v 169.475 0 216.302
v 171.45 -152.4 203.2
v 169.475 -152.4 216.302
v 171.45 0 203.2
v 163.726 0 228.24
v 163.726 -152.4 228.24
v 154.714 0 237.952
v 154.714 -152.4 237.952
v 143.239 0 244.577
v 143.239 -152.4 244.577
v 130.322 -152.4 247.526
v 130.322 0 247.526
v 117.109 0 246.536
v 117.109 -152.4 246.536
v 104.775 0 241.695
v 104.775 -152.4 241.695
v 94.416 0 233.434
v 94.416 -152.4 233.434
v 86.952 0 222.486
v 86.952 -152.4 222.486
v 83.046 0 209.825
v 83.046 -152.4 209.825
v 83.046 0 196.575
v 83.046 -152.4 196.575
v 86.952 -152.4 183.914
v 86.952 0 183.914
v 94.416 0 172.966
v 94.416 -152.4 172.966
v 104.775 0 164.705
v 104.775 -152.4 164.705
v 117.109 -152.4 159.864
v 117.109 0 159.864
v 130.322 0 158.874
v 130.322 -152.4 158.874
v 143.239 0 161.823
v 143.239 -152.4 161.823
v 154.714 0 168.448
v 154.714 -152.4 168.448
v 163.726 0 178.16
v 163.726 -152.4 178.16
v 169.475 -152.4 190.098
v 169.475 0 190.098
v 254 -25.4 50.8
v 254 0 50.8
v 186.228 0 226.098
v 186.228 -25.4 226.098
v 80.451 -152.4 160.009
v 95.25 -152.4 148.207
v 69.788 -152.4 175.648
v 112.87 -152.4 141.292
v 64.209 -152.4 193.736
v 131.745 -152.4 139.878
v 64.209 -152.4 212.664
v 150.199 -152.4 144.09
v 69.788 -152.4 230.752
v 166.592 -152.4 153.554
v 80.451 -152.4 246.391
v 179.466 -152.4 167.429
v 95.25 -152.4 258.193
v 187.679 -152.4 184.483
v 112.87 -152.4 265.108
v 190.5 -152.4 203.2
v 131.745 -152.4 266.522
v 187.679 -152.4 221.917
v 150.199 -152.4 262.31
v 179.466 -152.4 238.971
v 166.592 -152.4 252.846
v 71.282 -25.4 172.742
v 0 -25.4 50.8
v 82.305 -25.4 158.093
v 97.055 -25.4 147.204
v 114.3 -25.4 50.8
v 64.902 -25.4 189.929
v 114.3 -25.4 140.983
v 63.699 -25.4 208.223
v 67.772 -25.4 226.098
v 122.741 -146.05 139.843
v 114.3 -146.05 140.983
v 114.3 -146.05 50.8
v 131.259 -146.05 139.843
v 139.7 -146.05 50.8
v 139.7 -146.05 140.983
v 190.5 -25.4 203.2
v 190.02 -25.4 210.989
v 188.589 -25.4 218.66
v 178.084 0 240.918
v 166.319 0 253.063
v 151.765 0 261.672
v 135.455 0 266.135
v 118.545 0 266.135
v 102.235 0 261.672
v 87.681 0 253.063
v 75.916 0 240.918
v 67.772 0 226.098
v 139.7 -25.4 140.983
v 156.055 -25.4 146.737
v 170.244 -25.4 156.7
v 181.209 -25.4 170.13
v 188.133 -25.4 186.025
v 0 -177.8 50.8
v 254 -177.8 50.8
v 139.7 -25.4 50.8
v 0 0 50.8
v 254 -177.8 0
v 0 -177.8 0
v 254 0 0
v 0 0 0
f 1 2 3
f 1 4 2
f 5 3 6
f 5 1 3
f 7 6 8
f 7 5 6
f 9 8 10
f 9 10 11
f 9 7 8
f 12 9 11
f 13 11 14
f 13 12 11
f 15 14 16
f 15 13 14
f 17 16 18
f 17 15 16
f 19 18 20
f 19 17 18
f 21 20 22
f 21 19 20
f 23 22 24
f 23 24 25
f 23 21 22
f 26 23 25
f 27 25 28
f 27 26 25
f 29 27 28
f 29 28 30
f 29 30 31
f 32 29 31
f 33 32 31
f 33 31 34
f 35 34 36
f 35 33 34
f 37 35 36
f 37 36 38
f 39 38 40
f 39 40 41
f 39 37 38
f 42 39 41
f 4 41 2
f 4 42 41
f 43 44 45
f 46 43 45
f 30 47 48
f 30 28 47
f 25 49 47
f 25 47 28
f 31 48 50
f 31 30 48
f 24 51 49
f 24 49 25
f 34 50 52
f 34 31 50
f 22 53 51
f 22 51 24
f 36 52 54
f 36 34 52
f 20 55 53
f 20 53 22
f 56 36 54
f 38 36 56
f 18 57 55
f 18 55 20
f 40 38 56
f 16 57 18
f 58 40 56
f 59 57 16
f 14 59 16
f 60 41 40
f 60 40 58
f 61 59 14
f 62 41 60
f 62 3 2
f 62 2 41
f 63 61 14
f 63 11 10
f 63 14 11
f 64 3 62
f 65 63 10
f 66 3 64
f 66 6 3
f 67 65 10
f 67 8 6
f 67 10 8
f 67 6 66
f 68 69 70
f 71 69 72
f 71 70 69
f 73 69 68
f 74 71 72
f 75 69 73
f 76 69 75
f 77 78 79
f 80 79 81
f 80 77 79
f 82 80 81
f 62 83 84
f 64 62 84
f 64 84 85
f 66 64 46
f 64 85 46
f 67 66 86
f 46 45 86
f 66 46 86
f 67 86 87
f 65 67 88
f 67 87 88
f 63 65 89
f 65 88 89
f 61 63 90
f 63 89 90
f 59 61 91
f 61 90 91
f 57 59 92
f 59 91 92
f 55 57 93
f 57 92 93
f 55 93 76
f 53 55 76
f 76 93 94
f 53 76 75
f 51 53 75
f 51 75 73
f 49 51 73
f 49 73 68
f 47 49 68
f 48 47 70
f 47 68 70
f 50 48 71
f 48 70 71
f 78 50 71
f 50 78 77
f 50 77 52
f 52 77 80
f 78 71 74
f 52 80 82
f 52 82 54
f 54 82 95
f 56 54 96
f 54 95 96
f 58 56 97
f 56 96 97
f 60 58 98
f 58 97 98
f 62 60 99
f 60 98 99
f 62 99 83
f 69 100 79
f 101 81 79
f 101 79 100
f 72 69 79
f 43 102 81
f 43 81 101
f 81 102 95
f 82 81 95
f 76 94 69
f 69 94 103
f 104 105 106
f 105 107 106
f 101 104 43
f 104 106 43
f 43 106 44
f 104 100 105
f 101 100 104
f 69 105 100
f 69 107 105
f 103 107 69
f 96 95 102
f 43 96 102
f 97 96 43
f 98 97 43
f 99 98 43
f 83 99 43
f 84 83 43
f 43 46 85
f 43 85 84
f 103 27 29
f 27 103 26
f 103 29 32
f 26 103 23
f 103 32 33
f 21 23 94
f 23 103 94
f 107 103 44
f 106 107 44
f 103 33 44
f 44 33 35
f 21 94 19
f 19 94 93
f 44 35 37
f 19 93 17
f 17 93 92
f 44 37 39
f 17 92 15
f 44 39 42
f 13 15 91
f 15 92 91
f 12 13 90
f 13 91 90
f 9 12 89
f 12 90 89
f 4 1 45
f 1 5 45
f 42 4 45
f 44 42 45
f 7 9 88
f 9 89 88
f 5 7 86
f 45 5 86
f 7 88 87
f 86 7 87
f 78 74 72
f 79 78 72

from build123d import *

# Parameters (mm, degrees)
F0_R     = 44.45
F1_DEPTH = 25.4
F2_R     = 63.5
F2_R_2   = 44.45
F3_DEPTH = 127
F4_W     = 254
F4_H     = 50.8
F5_DEPTH = 152.4
F7_DEPTH = 120.65
F8_R     = 44.45
F9_DEPTH = 152.401


with BuildPart() as f1:
    # F0 (on Front) → F1 (new body)
    with BuildSketch(Plane.XZ):
        with BuildLine():
            Line((0, 50.8), (0, 0))
            Line((0, 0), (254, 0))
            Line((254, 0), (254, 50.8))
            Line((254, 50.8), (186.2277468166, 226.0981223472))
            ThreePointArc((186.2277468166, 226.0981223472), (127, 266.7), (67.7722531834, 226.0981223472))
            Line((67.7722531834, 226.0981223472), (0, 50.8))
        make_face()
        with Locations((127, 203.2)):
            Circle(F0_R, mode=Mode.SUBTRACT)
    extrude(amount=F1_DEPTH)

    # F2 (on face) → F3 (join)
    with BuildSketch(Plane.XZ.offset(25.4)):
        with Locations((127, 203.2)):
            Circle(F2_R)
        with Locations((127, 203.2)):
            Circle(F2_R_2, mode=Mode.SUBTRACT)
    extrude(amount=F3_DEPTH)

    # F4 (on face) → F5 (join)
    with BuildSketch(Plane.XZ.offset(25.4)):
        with Locations((127, 25.4)):
            Rectangle(F4_W, F4_H)
    extrude(amount=F5_DEPTH)

    # F6 (on face) → F7 (join)
    with BuildSketch(Plane.XZ.offset(25.4)):
        with BuildLine():
            ThreePointArc((139.7, 140.9829605333), (127, 139.7), (114.3, 140.9829605333))
            Line((114.3, 140.9829605333), (114.3, 50.8))
            Line((114.3, 50.8), (139.7, 50.8))
            Line((139.7, 50.8), (139.7, 140.9829605333))
        make_face()
    extrude(amount=F7_DEPTH)

    # F8 (on face) → F9 (cut, through all)
    with BuildSketch(Plane.XZ.offset(152.4)):
        with Locations((127, 203.2)):
            Circle(F8_R)
    extrude(amount=-F9_DEPTH, mode=Mode.SUBTRACT)


solid = f1.part
